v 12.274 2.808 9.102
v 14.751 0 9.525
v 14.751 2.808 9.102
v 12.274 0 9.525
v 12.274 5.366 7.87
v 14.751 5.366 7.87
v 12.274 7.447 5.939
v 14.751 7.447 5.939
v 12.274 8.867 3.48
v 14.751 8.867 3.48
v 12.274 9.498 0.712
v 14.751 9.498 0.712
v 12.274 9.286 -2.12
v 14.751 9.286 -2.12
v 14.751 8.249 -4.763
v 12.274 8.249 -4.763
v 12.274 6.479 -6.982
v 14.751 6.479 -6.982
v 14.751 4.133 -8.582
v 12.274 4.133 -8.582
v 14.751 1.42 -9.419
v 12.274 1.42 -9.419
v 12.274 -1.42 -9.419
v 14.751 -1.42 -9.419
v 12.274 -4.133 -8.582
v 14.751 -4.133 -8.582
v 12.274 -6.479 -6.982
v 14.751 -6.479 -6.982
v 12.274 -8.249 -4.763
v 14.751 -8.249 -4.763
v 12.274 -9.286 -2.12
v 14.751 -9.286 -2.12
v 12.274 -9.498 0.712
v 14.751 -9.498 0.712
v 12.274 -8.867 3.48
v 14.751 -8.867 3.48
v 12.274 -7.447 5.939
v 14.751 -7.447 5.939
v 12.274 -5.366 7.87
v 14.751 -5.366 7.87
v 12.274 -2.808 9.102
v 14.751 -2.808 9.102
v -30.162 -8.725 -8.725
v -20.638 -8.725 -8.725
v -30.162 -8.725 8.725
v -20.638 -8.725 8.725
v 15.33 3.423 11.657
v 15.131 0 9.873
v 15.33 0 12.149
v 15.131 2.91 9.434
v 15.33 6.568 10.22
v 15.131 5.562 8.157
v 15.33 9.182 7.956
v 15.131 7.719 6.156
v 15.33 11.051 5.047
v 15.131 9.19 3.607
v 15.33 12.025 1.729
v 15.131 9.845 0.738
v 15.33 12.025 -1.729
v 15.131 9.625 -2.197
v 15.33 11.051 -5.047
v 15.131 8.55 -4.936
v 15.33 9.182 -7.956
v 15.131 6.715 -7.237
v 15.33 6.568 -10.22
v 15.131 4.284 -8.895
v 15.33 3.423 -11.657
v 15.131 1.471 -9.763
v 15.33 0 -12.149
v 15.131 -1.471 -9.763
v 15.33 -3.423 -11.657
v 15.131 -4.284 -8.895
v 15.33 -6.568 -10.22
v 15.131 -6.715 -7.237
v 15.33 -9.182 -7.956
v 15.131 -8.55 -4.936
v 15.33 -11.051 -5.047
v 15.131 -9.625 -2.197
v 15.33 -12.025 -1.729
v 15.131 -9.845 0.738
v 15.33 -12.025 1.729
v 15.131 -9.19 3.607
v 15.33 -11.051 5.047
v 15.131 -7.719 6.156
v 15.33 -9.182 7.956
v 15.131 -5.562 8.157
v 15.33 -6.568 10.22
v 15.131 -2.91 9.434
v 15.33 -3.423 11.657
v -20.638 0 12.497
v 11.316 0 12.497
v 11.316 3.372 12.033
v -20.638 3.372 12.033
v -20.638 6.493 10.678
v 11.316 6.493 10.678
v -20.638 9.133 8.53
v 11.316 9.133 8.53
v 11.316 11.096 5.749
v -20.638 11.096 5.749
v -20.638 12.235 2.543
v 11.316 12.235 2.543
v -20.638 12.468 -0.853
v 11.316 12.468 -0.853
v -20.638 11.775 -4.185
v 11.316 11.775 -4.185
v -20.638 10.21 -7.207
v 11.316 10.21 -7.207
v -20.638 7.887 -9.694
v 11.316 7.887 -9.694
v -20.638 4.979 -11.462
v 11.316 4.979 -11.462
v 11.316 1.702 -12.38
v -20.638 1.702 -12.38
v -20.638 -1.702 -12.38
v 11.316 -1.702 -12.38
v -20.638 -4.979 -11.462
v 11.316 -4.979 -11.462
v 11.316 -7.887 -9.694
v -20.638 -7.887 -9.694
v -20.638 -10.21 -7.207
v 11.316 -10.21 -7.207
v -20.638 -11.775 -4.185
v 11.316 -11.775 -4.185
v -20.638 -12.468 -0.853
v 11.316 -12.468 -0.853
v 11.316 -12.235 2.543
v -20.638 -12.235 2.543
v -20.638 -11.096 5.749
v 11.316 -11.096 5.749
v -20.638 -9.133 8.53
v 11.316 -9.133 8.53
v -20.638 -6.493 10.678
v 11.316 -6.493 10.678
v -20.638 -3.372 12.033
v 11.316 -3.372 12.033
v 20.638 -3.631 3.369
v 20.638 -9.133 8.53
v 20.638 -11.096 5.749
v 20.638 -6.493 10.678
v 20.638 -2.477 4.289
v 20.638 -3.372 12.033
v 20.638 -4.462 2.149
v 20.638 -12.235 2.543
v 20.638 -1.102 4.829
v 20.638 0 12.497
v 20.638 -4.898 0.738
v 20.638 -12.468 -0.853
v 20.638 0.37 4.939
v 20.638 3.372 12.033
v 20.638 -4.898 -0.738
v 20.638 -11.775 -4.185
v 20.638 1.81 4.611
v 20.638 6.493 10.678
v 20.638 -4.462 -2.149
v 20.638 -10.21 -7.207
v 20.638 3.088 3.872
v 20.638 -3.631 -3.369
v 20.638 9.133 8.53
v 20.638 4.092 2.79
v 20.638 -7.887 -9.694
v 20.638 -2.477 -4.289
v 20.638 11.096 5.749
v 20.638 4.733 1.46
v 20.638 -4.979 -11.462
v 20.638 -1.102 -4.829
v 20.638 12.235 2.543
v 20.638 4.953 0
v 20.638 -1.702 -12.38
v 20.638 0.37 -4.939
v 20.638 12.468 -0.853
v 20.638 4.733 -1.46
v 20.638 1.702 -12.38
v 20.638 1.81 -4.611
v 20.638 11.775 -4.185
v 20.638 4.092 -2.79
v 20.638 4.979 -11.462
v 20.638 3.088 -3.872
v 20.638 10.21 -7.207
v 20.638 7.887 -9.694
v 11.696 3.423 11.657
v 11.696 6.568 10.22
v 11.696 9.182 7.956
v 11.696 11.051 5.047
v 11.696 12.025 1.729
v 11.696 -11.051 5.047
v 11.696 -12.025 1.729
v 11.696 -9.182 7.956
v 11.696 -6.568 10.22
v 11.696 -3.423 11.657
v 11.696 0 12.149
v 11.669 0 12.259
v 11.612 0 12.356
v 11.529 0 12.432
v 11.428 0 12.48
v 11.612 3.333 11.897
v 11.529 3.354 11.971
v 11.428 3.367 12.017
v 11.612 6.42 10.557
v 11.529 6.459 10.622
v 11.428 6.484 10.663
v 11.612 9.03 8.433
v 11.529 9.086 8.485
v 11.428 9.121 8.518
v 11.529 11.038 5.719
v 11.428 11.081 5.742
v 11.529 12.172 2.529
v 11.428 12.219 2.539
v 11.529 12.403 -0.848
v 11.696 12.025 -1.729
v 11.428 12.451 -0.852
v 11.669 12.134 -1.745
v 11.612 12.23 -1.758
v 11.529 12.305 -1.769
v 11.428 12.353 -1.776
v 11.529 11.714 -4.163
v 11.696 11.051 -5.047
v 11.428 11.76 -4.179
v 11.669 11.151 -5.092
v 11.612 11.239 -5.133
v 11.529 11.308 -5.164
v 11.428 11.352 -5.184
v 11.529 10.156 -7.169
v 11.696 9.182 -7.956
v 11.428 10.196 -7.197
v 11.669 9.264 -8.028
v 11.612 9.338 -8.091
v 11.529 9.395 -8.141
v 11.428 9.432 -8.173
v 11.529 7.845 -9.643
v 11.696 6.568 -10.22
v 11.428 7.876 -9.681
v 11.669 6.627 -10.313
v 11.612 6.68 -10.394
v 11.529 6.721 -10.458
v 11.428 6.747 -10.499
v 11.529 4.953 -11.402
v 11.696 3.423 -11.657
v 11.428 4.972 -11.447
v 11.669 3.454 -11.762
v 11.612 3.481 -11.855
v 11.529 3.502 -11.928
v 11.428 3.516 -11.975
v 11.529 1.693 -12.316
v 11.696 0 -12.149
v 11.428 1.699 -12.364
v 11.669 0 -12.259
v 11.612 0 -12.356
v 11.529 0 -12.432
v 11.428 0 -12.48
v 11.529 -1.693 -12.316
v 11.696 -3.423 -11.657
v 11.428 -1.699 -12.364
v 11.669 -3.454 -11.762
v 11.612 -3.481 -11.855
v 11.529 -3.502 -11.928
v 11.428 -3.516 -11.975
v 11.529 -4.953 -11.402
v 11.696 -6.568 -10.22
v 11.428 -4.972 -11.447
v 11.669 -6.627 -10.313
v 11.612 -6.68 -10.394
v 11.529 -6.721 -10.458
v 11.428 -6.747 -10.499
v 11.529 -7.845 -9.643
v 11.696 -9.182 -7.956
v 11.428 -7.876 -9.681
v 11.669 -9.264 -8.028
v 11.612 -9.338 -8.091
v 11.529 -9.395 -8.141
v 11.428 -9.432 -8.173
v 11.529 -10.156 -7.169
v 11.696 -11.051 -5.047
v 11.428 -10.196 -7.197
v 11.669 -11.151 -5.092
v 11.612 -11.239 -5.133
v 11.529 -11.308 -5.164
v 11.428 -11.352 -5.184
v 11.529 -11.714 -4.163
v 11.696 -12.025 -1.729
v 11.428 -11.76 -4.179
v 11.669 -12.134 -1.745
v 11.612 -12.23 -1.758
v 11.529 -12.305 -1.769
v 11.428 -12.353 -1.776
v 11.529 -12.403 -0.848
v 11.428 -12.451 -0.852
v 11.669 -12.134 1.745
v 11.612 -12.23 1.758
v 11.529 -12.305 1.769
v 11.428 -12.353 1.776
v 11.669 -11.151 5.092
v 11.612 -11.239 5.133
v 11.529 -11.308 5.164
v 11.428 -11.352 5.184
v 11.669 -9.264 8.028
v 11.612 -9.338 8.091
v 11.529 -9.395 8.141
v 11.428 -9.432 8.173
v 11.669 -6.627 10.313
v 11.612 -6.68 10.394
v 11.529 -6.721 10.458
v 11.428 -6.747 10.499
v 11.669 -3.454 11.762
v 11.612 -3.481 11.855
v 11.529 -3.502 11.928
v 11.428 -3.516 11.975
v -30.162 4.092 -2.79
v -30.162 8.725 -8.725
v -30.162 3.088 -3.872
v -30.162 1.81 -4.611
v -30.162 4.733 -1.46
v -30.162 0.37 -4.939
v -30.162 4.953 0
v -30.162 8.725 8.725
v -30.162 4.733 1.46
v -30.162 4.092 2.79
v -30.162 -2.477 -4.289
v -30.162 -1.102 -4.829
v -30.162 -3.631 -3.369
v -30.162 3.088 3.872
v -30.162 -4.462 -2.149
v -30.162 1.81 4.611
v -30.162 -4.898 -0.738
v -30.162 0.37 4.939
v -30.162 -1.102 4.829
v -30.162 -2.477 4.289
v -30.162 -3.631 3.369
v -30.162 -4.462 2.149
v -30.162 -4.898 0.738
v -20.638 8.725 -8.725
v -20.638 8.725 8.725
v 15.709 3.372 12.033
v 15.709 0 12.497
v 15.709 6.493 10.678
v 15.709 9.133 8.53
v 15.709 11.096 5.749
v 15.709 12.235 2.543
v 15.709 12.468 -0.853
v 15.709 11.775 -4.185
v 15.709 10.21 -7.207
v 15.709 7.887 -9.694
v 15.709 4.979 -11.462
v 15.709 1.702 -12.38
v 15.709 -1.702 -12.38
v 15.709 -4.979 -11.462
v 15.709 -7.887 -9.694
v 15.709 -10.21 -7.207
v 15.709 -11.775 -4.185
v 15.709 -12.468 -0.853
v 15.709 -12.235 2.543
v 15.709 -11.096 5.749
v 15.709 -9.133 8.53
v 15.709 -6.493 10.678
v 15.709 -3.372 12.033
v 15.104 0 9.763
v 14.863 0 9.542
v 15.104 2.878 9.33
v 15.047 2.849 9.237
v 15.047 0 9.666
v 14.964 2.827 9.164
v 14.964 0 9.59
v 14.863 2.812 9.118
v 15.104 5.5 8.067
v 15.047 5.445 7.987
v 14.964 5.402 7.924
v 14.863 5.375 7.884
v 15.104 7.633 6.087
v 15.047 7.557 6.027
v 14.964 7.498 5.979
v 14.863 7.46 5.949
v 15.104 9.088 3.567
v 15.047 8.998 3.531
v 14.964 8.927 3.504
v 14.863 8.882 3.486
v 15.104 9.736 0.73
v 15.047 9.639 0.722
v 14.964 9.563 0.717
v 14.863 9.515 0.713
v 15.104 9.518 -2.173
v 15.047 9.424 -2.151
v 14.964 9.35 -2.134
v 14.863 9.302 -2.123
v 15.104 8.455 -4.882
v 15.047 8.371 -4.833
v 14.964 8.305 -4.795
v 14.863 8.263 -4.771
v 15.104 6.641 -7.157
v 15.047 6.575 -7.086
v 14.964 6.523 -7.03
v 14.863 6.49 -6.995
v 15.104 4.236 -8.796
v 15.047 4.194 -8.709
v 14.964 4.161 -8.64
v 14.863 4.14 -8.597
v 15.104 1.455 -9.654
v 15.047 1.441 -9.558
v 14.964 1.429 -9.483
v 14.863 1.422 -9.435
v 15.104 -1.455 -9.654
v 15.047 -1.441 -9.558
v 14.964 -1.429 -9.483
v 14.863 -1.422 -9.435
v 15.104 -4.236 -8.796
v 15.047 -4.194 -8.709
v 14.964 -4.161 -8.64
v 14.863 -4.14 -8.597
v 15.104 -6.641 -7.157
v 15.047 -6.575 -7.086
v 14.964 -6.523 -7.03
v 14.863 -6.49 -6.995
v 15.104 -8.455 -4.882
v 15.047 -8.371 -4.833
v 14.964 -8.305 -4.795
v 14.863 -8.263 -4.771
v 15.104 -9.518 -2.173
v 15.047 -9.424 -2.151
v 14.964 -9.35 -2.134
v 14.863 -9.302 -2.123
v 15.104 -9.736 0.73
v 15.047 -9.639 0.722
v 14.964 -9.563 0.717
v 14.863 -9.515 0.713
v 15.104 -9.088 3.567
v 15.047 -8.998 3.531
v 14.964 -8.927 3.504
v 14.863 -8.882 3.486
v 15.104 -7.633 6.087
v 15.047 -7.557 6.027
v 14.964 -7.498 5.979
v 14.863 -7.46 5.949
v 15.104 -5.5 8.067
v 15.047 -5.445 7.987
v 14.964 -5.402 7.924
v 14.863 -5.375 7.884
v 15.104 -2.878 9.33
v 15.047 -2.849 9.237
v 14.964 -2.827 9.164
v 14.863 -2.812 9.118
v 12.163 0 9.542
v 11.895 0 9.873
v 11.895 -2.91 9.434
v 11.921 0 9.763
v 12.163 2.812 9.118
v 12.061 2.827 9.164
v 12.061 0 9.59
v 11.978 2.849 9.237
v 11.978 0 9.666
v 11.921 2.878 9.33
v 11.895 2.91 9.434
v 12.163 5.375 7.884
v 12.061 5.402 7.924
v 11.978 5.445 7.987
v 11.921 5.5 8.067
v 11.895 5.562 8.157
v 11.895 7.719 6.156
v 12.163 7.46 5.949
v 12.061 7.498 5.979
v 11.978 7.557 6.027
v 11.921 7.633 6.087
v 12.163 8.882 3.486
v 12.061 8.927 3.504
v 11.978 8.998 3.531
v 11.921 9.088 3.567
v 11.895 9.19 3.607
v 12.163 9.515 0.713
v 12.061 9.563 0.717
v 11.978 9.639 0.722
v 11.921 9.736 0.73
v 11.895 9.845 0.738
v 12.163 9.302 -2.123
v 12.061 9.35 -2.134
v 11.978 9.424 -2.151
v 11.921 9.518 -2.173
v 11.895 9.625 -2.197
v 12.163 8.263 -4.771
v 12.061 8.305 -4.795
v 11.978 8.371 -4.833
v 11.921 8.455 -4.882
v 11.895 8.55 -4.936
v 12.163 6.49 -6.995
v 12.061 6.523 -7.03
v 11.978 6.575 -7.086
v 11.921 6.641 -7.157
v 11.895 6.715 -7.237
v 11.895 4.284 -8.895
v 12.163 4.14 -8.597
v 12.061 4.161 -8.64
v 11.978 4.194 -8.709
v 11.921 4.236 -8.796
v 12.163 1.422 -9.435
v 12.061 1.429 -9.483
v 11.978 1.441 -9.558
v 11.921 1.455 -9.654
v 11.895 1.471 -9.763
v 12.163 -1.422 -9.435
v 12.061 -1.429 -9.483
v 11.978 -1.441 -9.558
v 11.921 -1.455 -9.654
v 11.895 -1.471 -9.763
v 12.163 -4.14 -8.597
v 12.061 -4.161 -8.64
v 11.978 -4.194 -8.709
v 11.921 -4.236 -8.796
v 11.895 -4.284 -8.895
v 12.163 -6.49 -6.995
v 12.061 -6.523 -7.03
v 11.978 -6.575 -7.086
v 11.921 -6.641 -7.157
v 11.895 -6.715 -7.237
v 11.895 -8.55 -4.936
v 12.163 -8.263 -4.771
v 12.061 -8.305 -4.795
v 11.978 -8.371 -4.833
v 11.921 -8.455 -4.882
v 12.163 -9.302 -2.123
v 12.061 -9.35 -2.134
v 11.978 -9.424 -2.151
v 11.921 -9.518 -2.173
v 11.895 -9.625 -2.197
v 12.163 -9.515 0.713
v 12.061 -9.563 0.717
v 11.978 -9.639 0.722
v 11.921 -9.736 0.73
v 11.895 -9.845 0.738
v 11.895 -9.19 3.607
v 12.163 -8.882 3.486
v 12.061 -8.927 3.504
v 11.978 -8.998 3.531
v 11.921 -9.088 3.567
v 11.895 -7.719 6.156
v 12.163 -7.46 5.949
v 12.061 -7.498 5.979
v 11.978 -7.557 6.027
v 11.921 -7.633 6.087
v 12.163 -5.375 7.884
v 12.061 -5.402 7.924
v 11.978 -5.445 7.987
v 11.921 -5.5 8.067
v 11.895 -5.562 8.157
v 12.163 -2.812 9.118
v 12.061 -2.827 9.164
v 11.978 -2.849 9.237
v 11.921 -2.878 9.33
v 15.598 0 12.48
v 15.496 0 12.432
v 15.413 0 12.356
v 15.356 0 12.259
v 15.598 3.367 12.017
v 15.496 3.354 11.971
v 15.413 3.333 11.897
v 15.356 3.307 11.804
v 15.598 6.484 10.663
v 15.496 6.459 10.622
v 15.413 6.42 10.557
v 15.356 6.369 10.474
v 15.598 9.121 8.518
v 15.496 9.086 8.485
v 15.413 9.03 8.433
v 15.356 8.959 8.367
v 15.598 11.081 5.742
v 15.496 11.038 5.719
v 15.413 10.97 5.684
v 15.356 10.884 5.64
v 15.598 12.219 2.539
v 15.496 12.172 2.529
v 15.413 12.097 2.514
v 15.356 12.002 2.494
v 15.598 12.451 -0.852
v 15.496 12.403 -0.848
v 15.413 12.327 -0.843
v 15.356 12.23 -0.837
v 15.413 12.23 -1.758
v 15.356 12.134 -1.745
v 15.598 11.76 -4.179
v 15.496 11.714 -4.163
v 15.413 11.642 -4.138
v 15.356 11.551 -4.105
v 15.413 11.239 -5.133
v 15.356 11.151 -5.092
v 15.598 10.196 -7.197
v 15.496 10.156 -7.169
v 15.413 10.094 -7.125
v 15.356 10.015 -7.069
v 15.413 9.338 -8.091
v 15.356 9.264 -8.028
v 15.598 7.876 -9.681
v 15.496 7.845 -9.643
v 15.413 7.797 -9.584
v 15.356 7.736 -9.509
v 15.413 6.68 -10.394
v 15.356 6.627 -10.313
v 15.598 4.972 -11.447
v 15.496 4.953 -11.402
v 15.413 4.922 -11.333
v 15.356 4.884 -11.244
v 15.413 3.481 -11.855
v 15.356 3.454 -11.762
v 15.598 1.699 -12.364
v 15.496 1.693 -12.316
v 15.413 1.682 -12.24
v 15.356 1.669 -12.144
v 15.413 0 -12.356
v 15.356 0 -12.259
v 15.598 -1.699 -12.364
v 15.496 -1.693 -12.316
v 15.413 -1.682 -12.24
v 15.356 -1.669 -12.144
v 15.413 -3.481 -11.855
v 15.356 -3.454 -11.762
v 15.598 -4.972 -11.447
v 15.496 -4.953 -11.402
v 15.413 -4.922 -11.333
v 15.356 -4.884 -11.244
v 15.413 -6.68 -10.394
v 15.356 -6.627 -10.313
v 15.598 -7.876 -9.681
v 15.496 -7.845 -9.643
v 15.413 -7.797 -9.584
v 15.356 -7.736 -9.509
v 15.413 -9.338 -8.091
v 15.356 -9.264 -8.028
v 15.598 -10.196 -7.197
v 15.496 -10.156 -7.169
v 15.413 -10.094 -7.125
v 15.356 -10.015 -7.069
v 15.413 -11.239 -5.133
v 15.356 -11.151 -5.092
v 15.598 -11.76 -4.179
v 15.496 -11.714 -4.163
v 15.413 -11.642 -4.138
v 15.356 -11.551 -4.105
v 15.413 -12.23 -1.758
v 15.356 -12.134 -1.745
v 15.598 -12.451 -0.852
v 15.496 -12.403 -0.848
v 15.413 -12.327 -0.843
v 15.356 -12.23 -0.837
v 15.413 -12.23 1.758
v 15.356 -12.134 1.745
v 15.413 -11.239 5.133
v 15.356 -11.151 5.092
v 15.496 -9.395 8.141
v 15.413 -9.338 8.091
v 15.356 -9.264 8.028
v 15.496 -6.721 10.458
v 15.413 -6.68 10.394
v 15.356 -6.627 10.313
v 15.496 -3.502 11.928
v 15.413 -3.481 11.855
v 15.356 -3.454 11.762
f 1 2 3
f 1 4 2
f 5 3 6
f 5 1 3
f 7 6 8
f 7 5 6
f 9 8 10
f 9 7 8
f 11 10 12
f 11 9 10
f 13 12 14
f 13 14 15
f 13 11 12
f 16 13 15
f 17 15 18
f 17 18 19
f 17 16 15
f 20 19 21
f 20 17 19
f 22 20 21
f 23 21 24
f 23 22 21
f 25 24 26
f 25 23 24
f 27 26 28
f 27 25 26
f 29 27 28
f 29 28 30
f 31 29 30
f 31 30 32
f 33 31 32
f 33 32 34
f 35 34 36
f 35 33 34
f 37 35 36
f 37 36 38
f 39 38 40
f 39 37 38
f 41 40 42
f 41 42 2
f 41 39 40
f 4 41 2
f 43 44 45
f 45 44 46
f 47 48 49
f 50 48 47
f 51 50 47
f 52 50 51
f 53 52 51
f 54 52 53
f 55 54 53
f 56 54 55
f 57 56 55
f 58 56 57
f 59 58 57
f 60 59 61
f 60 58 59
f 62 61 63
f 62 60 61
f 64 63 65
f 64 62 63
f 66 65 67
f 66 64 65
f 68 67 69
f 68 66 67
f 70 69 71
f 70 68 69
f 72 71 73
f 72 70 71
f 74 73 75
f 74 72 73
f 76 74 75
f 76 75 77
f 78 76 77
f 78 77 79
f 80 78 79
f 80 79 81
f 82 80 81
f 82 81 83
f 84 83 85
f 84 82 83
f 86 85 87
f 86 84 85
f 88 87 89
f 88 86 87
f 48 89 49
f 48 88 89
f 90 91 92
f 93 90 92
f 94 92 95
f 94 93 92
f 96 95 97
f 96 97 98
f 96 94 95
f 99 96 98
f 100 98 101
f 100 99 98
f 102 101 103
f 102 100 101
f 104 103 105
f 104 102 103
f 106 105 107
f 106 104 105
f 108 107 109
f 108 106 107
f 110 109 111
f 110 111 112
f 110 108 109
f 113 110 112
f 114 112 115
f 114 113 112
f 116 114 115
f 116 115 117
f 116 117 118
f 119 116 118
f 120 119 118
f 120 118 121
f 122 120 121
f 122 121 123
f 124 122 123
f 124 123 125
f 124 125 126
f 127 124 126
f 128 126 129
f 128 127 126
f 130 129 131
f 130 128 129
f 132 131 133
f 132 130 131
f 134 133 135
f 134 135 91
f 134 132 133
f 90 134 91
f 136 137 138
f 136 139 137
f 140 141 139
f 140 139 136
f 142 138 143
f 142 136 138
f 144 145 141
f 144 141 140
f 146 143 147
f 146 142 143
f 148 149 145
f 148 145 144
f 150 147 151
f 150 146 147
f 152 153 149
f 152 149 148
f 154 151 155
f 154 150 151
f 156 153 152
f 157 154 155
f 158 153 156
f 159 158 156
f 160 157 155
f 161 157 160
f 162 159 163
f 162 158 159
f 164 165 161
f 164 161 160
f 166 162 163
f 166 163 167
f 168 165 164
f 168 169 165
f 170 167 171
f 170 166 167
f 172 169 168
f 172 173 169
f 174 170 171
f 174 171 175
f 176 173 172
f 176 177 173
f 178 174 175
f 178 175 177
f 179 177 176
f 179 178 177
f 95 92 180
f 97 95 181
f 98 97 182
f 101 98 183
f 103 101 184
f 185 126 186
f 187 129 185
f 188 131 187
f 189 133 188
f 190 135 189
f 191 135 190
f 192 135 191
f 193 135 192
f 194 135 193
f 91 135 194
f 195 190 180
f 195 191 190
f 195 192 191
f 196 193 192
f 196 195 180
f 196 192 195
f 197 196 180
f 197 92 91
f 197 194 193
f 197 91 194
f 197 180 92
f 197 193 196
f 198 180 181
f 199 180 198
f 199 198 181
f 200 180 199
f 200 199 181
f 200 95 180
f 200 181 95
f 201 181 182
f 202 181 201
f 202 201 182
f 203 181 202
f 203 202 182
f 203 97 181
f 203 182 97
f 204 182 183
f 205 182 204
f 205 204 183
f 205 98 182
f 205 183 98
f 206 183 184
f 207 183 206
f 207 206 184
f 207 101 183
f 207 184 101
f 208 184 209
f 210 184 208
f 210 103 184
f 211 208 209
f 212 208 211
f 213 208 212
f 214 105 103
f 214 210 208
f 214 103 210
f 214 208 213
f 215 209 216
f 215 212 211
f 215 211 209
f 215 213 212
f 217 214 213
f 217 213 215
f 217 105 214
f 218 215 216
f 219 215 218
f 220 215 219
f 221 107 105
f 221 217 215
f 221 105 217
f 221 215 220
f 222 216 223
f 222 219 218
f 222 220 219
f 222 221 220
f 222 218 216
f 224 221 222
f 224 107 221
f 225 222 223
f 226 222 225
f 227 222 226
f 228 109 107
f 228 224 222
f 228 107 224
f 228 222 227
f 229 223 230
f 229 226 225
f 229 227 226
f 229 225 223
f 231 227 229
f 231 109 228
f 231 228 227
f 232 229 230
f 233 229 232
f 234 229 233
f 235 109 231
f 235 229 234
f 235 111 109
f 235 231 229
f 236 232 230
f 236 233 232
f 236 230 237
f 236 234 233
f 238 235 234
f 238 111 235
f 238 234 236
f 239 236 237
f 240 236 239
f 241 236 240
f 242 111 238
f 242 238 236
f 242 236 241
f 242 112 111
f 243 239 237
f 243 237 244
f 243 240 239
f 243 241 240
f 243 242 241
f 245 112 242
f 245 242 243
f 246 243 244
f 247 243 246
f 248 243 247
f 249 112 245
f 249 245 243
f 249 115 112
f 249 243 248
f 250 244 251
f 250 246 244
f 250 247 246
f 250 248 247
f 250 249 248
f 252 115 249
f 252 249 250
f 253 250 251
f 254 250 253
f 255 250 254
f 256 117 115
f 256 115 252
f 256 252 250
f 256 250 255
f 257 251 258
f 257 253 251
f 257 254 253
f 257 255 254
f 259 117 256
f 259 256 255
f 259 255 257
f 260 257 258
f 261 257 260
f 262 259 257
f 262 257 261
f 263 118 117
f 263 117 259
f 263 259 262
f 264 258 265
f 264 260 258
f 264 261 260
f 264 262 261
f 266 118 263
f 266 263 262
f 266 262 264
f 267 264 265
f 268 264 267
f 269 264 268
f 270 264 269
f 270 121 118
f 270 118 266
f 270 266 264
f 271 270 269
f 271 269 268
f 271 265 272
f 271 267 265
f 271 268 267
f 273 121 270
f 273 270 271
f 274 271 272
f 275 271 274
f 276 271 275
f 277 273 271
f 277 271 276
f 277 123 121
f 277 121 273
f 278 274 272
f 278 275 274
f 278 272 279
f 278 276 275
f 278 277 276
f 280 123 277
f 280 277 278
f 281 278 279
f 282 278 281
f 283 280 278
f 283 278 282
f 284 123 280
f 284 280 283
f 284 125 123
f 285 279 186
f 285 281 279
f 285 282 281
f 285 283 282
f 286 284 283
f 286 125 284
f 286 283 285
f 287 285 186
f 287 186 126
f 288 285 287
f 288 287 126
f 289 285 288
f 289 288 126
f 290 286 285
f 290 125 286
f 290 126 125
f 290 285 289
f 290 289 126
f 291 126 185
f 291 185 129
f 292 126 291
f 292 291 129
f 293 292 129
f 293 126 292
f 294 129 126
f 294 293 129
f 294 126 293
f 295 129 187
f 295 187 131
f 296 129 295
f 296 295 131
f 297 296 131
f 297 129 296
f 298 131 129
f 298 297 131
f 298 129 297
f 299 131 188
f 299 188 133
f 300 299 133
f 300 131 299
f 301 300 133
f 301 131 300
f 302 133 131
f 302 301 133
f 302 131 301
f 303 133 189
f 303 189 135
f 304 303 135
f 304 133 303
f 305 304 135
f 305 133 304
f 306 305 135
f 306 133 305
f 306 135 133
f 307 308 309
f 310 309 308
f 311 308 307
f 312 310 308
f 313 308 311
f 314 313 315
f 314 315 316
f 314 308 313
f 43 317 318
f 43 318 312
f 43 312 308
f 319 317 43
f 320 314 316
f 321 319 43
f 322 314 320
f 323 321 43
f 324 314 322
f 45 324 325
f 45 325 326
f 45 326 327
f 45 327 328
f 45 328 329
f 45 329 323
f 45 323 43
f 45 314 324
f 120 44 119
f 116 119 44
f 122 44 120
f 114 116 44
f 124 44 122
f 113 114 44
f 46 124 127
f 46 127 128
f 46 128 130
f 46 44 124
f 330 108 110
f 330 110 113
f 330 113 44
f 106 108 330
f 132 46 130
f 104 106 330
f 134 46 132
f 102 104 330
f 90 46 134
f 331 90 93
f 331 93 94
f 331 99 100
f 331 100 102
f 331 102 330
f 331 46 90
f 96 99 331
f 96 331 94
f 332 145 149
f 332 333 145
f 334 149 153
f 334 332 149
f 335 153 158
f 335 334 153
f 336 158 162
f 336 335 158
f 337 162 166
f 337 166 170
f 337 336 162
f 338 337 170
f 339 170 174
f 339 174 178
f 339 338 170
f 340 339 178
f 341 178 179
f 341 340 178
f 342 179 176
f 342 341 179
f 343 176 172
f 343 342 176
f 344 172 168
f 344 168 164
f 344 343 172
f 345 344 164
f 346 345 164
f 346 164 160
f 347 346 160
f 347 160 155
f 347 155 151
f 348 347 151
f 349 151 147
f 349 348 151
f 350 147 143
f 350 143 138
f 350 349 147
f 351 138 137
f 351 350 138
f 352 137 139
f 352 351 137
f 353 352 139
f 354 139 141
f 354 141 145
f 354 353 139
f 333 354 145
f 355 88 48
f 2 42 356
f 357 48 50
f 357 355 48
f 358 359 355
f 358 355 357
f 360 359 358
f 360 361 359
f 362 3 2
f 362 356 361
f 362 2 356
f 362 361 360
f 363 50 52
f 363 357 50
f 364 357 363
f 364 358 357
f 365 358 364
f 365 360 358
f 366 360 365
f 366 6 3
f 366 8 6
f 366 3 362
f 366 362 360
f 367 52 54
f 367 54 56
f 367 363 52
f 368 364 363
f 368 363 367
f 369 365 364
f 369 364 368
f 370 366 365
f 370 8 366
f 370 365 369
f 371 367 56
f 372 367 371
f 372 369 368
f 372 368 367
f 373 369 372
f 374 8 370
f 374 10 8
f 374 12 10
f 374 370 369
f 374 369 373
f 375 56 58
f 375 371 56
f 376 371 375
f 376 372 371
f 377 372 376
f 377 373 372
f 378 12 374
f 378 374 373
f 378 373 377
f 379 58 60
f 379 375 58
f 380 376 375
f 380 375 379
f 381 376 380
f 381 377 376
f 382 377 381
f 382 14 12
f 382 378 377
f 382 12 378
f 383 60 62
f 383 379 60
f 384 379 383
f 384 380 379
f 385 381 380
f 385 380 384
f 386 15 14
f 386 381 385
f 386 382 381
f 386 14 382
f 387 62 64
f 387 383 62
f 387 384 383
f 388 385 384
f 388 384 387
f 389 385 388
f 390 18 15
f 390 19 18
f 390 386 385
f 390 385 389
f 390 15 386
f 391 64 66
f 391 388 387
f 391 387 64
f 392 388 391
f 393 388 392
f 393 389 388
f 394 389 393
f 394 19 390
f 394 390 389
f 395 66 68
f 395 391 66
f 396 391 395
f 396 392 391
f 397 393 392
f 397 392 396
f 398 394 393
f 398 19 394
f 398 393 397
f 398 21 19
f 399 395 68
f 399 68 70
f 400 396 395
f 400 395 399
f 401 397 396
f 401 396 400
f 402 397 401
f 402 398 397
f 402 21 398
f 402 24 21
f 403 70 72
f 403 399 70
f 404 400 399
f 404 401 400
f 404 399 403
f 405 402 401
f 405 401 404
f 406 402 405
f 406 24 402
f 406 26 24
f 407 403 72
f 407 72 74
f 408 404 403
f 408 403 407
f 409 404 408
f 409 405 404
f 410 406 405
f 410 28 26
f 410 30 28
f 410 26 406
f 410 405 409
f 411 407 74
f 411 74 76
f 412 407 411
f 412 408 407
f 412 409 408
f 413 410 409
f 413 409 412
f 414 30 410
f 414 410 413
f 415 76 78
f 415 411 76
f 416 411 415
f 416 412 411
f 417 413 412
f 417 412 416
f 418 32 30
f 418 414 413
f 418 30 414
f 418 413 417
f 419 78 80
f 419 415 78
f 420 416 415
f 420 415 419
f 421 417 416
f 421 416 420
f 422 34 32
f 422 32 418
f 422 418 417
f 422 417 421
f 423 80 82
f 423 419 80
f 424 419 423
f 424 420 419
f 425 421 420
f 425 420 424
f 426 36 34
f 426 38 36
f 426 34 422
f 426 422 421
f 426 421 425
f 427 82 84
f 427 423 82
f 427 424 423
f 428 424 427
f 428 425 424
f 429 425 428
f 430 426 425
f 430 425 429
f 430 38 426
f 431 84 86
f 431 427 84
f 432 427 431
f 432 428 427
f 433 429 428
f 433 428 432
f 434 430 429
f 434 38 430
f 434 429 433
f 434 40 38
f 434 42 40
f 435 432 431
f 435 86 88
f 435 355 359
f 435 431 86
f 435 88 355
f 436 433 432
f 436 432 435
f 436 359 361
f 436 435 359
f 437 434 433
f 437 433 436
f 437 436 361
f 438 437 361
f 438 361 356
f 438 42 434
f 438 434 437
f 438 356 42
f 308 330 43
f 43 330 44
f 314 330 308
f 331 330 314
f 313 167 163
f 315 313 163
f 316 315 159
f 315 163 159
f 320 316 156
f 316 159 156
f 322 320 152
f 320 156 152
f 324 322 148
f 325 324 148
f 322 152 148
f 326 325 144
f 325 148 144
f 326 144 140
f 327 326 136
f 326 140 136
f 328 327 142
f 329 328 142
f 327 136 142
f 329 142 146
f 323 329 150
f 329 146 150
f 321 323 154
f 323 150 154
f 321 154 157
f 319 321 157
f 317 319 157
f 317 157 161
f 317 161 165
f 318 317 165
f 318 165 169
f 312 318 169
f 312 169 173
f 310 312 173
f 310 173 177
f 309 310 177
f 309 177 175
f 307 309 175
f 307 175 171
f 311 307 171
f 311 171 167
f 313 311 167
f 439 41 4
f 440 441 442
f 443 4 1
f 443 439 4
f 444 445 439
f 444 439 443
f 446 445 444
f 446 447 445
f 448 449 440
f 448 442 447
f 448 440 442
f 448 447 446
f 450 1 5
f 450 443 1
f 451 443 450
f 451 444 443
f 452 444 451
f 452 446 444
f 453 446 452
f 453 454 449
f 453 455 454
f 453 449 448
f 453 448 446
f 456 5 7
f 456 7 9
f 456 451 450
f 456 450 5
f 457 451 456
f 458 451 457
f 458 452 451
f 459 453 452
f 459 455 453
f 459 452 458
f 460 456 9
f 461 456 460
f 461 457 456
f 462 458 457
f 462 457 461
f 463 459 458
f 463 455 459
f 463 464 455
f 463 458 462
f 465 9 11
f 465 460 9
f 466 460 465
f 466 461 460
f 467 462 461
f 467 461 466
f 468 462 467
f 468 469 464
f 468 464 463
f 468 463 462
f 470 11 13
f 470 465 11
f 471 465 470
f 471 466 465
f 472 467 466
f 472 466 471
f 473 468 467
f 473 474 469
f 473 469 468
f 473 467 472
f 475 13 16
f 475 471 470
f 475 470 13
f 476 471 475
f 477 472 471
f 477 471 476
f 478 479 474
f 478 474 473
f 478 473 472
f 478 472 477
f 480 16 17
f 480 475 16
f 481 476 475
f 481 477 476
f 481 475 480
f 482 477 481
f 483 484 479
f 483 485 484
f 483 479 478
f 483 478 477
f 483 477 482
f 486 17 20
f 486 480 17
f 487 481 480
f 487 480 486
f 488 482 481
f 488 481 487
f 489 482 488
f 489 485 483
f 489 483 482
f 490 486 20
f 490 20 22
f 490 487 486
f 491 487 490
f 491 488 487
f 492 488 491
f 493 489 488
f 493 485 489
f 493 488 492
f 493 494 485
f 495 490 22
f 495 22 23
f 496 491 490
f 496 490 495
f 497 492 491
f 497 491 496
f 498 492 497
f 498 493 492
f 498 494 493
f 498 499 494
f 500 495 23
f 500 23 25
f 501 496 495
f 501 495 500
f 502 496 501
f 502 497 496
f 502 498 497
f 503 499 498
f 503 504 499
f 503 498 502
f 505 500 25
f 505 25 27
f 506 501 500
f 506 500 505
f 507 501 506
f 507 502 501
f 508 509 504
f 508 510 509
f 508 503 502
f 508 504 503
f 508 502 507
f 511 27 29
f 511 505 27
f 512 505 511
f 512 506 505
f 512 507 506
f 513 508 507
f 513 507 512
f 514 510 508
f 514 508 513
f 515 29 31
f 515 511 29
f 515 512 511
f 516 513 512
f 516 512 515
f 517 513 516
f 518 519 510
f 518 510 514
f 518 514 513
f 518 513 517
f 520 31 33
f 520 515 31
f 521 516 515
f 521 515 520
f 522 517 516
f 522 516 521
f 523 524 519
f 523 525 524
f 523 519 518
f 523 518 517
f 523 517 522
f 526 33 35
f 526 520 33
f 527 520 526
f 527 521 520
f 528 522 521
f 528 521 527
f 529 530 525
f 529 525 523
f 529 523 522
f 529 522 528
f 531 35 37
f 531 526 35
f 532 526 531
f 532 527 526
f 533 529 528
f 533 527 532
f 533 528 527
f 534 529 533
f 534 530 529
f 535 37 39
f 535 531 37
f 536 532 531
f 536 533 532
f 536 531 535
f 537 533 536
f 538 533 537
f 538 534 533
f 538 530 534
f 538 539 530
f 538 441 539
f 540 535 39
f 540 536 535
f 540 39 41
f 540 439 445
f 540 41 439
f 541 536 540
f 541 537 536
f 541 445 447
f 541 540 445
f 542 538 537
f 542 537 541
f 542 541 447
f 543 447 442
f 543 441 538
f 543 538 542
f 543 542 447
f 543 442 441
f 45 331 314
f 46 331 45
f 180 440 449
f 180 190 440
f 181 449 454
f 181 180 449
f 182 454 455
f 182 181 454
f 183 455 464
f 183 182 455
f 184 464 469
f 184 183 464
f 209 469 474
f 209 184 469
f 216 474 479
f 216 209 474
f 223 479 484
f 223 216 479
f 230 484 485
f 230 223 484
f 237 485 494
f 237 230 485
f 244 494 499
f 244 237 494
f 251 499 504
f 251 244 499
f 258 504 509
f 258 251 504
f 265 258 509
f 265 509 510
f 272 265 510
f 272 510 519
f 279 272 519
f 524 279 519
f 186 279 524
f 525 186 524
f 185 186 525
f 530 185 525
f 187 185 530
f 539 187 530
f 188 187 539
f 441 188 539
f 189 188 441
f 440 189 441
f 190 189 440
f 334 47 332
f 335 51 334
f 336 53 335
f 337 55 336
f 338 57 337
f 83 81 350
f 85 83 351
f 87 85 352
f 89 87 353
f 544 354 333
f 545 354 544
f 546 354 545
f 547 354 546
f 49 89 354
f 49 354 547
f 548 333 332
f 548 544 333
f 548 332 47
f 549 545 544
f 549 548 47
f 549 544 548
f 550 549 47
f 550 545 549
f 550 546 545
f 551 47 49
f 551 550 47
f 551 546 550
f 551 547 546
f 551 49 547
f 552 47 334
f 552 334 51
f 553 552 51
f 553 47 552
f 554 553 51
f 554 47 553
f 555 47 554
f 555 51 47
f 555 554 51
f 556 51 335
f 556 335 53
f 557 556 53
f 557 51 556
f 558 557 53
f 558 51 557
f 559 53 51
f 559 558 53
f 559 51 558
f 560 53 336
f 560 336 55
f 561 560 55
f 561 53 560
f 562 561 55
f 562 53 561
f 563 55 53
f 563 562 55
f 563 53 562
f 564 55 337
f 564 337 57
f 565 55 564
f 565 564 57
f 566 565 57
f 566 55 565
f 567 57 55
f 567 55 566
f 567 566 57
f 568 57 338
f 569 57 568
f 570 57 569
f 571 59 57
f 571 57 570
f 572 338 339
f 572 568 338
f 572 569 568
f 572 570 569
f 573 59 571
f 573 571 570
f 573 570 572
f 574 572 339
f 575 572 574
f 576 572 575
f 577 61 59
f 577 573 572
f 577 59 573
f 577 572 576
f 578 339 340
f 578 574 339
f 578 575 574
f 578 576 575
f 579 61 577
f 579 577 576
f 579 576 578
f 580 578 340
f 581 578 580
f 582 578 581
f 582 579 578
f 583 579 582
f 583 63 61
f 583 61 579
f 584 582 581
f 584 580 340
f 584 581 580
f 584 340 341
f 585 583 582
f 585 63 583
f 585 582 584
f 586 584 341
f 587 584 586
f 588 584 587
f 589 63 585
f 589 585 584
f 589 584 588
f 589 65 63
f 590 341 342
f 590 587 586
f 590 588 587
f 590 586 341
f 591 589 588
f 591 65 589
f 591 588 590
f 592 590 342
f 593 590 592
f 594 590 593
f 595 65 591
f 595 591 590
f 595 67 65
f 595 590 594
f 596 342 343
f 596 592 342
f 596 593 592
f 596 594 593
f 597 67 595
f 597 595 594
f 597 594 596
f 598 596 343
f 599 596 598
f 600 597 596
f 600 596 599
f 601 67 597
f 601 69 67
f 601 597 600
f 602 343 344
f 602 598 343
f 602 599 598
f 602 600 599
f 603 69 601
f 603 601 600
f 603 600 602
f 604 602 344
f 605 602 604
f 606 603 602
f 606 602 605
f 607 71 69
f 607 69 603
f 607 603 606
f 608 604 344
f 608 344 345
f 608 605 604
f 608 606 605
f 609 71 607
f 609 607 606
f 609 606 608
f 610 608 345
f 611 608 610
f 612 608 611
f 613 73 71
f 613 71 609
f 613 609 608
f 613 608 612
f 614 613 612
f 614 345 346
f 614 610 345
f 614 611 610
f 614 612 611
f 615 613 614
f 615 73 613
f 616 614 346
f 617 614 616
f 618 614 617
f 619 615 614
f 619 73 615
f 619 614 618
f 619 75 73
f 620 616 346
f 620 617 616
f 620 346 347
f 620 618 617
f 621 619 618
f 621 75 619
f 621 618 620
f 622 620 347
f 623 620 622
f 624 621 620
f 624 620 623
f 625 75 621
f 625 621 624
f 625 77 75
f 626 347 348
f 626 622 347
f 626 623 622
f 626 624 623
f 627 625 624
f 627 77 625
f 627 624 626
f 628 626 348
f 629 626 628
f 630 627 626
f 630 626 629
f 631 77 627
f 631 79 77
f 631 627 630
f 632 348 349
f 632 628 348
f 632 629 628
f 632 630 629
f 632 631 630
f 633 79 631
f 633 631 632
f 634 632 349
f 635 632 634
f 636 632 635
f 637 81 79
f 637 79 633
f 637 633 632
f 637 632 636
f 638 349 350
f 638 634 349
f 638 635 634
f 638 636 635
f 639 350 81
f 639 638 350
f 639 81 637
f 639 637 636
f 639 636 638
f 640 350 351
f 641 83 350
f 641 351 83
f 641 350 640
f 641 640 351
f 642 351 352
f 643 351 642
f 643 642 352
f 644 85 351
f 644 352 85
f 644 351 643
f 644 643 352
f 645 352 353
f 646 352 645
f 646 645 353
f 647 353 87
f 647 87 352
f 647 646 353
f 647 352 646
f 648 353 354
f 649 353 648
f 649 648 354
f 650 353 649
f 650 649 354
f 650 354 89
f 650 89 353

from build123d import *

# Parameters (mm, degrees)
F2_W     = 17.4498
F2_H     = 17.4498
F3_DEPTH = 9.525
F4_R     = 4.953
F5_DEPTH = 50.801


with BuildPart() as f1:
    # F0 (on Front) → F1 (revolve)
    with BuildSketch(Plane.XZ):
        with BuildLine():
            Line((11.316179, 12.4968), (-20.6375, 12.4968))
            Line((-20.6375, 12.4968), (-20.6375, 0))
            Line((-20.6375, 0), (20.6375, 0))
            Line((20.6375, 0), (20.6375, 12.4968))
            Line((20.6375, 12.4968), (15.709421, 12.4968))
            ThreePointArc((15.709421, 12.4968), (15.452021, 12.396703), (15.329871, 12.149006))
            Line((15.329871, 12.149006), (15.130728, 9.872794))
            ThreePointArc((15.130728, 9.872794), (15.008578, 9.625097), (14.751178, 9.525))
            Line((14.751178, 9.525), (12.274422, 9.525))
            ThreePointArc((12.274422, 9.525), (12.017022, 9.625097), (11.894872, 9.872794))
            Line((11.894872, 9.872794), (11.695729, 12.149006))
            ThreePointArc((11.695729, 12.149006), (11.573579, 12.396703), (11.316179, 12.4968))
        make_face()
    revolve(axis=Axis((-2.210241, 0, 0), (-1, 0, 0)))

    # F2 (on face) → F3 (join)
    with BuildSketch(Plane(origin=(-20.6375, 0, 0), x_dir=(0, -1, 0), z_dir=(-1, 0, 0))):
        Rectangle(F2_W, F2_H)
    extrude(amount=F3_DEPTH)

    # F4 (on face) → F5 (cut, through all)
    with BuildSketch(Plane.YZ.offset(20.6375)):
        Circle(F4_R)
    extrude(amount=-F5_DEPTH, mode=Mode.SUBTRACT)


solid = f1.part
